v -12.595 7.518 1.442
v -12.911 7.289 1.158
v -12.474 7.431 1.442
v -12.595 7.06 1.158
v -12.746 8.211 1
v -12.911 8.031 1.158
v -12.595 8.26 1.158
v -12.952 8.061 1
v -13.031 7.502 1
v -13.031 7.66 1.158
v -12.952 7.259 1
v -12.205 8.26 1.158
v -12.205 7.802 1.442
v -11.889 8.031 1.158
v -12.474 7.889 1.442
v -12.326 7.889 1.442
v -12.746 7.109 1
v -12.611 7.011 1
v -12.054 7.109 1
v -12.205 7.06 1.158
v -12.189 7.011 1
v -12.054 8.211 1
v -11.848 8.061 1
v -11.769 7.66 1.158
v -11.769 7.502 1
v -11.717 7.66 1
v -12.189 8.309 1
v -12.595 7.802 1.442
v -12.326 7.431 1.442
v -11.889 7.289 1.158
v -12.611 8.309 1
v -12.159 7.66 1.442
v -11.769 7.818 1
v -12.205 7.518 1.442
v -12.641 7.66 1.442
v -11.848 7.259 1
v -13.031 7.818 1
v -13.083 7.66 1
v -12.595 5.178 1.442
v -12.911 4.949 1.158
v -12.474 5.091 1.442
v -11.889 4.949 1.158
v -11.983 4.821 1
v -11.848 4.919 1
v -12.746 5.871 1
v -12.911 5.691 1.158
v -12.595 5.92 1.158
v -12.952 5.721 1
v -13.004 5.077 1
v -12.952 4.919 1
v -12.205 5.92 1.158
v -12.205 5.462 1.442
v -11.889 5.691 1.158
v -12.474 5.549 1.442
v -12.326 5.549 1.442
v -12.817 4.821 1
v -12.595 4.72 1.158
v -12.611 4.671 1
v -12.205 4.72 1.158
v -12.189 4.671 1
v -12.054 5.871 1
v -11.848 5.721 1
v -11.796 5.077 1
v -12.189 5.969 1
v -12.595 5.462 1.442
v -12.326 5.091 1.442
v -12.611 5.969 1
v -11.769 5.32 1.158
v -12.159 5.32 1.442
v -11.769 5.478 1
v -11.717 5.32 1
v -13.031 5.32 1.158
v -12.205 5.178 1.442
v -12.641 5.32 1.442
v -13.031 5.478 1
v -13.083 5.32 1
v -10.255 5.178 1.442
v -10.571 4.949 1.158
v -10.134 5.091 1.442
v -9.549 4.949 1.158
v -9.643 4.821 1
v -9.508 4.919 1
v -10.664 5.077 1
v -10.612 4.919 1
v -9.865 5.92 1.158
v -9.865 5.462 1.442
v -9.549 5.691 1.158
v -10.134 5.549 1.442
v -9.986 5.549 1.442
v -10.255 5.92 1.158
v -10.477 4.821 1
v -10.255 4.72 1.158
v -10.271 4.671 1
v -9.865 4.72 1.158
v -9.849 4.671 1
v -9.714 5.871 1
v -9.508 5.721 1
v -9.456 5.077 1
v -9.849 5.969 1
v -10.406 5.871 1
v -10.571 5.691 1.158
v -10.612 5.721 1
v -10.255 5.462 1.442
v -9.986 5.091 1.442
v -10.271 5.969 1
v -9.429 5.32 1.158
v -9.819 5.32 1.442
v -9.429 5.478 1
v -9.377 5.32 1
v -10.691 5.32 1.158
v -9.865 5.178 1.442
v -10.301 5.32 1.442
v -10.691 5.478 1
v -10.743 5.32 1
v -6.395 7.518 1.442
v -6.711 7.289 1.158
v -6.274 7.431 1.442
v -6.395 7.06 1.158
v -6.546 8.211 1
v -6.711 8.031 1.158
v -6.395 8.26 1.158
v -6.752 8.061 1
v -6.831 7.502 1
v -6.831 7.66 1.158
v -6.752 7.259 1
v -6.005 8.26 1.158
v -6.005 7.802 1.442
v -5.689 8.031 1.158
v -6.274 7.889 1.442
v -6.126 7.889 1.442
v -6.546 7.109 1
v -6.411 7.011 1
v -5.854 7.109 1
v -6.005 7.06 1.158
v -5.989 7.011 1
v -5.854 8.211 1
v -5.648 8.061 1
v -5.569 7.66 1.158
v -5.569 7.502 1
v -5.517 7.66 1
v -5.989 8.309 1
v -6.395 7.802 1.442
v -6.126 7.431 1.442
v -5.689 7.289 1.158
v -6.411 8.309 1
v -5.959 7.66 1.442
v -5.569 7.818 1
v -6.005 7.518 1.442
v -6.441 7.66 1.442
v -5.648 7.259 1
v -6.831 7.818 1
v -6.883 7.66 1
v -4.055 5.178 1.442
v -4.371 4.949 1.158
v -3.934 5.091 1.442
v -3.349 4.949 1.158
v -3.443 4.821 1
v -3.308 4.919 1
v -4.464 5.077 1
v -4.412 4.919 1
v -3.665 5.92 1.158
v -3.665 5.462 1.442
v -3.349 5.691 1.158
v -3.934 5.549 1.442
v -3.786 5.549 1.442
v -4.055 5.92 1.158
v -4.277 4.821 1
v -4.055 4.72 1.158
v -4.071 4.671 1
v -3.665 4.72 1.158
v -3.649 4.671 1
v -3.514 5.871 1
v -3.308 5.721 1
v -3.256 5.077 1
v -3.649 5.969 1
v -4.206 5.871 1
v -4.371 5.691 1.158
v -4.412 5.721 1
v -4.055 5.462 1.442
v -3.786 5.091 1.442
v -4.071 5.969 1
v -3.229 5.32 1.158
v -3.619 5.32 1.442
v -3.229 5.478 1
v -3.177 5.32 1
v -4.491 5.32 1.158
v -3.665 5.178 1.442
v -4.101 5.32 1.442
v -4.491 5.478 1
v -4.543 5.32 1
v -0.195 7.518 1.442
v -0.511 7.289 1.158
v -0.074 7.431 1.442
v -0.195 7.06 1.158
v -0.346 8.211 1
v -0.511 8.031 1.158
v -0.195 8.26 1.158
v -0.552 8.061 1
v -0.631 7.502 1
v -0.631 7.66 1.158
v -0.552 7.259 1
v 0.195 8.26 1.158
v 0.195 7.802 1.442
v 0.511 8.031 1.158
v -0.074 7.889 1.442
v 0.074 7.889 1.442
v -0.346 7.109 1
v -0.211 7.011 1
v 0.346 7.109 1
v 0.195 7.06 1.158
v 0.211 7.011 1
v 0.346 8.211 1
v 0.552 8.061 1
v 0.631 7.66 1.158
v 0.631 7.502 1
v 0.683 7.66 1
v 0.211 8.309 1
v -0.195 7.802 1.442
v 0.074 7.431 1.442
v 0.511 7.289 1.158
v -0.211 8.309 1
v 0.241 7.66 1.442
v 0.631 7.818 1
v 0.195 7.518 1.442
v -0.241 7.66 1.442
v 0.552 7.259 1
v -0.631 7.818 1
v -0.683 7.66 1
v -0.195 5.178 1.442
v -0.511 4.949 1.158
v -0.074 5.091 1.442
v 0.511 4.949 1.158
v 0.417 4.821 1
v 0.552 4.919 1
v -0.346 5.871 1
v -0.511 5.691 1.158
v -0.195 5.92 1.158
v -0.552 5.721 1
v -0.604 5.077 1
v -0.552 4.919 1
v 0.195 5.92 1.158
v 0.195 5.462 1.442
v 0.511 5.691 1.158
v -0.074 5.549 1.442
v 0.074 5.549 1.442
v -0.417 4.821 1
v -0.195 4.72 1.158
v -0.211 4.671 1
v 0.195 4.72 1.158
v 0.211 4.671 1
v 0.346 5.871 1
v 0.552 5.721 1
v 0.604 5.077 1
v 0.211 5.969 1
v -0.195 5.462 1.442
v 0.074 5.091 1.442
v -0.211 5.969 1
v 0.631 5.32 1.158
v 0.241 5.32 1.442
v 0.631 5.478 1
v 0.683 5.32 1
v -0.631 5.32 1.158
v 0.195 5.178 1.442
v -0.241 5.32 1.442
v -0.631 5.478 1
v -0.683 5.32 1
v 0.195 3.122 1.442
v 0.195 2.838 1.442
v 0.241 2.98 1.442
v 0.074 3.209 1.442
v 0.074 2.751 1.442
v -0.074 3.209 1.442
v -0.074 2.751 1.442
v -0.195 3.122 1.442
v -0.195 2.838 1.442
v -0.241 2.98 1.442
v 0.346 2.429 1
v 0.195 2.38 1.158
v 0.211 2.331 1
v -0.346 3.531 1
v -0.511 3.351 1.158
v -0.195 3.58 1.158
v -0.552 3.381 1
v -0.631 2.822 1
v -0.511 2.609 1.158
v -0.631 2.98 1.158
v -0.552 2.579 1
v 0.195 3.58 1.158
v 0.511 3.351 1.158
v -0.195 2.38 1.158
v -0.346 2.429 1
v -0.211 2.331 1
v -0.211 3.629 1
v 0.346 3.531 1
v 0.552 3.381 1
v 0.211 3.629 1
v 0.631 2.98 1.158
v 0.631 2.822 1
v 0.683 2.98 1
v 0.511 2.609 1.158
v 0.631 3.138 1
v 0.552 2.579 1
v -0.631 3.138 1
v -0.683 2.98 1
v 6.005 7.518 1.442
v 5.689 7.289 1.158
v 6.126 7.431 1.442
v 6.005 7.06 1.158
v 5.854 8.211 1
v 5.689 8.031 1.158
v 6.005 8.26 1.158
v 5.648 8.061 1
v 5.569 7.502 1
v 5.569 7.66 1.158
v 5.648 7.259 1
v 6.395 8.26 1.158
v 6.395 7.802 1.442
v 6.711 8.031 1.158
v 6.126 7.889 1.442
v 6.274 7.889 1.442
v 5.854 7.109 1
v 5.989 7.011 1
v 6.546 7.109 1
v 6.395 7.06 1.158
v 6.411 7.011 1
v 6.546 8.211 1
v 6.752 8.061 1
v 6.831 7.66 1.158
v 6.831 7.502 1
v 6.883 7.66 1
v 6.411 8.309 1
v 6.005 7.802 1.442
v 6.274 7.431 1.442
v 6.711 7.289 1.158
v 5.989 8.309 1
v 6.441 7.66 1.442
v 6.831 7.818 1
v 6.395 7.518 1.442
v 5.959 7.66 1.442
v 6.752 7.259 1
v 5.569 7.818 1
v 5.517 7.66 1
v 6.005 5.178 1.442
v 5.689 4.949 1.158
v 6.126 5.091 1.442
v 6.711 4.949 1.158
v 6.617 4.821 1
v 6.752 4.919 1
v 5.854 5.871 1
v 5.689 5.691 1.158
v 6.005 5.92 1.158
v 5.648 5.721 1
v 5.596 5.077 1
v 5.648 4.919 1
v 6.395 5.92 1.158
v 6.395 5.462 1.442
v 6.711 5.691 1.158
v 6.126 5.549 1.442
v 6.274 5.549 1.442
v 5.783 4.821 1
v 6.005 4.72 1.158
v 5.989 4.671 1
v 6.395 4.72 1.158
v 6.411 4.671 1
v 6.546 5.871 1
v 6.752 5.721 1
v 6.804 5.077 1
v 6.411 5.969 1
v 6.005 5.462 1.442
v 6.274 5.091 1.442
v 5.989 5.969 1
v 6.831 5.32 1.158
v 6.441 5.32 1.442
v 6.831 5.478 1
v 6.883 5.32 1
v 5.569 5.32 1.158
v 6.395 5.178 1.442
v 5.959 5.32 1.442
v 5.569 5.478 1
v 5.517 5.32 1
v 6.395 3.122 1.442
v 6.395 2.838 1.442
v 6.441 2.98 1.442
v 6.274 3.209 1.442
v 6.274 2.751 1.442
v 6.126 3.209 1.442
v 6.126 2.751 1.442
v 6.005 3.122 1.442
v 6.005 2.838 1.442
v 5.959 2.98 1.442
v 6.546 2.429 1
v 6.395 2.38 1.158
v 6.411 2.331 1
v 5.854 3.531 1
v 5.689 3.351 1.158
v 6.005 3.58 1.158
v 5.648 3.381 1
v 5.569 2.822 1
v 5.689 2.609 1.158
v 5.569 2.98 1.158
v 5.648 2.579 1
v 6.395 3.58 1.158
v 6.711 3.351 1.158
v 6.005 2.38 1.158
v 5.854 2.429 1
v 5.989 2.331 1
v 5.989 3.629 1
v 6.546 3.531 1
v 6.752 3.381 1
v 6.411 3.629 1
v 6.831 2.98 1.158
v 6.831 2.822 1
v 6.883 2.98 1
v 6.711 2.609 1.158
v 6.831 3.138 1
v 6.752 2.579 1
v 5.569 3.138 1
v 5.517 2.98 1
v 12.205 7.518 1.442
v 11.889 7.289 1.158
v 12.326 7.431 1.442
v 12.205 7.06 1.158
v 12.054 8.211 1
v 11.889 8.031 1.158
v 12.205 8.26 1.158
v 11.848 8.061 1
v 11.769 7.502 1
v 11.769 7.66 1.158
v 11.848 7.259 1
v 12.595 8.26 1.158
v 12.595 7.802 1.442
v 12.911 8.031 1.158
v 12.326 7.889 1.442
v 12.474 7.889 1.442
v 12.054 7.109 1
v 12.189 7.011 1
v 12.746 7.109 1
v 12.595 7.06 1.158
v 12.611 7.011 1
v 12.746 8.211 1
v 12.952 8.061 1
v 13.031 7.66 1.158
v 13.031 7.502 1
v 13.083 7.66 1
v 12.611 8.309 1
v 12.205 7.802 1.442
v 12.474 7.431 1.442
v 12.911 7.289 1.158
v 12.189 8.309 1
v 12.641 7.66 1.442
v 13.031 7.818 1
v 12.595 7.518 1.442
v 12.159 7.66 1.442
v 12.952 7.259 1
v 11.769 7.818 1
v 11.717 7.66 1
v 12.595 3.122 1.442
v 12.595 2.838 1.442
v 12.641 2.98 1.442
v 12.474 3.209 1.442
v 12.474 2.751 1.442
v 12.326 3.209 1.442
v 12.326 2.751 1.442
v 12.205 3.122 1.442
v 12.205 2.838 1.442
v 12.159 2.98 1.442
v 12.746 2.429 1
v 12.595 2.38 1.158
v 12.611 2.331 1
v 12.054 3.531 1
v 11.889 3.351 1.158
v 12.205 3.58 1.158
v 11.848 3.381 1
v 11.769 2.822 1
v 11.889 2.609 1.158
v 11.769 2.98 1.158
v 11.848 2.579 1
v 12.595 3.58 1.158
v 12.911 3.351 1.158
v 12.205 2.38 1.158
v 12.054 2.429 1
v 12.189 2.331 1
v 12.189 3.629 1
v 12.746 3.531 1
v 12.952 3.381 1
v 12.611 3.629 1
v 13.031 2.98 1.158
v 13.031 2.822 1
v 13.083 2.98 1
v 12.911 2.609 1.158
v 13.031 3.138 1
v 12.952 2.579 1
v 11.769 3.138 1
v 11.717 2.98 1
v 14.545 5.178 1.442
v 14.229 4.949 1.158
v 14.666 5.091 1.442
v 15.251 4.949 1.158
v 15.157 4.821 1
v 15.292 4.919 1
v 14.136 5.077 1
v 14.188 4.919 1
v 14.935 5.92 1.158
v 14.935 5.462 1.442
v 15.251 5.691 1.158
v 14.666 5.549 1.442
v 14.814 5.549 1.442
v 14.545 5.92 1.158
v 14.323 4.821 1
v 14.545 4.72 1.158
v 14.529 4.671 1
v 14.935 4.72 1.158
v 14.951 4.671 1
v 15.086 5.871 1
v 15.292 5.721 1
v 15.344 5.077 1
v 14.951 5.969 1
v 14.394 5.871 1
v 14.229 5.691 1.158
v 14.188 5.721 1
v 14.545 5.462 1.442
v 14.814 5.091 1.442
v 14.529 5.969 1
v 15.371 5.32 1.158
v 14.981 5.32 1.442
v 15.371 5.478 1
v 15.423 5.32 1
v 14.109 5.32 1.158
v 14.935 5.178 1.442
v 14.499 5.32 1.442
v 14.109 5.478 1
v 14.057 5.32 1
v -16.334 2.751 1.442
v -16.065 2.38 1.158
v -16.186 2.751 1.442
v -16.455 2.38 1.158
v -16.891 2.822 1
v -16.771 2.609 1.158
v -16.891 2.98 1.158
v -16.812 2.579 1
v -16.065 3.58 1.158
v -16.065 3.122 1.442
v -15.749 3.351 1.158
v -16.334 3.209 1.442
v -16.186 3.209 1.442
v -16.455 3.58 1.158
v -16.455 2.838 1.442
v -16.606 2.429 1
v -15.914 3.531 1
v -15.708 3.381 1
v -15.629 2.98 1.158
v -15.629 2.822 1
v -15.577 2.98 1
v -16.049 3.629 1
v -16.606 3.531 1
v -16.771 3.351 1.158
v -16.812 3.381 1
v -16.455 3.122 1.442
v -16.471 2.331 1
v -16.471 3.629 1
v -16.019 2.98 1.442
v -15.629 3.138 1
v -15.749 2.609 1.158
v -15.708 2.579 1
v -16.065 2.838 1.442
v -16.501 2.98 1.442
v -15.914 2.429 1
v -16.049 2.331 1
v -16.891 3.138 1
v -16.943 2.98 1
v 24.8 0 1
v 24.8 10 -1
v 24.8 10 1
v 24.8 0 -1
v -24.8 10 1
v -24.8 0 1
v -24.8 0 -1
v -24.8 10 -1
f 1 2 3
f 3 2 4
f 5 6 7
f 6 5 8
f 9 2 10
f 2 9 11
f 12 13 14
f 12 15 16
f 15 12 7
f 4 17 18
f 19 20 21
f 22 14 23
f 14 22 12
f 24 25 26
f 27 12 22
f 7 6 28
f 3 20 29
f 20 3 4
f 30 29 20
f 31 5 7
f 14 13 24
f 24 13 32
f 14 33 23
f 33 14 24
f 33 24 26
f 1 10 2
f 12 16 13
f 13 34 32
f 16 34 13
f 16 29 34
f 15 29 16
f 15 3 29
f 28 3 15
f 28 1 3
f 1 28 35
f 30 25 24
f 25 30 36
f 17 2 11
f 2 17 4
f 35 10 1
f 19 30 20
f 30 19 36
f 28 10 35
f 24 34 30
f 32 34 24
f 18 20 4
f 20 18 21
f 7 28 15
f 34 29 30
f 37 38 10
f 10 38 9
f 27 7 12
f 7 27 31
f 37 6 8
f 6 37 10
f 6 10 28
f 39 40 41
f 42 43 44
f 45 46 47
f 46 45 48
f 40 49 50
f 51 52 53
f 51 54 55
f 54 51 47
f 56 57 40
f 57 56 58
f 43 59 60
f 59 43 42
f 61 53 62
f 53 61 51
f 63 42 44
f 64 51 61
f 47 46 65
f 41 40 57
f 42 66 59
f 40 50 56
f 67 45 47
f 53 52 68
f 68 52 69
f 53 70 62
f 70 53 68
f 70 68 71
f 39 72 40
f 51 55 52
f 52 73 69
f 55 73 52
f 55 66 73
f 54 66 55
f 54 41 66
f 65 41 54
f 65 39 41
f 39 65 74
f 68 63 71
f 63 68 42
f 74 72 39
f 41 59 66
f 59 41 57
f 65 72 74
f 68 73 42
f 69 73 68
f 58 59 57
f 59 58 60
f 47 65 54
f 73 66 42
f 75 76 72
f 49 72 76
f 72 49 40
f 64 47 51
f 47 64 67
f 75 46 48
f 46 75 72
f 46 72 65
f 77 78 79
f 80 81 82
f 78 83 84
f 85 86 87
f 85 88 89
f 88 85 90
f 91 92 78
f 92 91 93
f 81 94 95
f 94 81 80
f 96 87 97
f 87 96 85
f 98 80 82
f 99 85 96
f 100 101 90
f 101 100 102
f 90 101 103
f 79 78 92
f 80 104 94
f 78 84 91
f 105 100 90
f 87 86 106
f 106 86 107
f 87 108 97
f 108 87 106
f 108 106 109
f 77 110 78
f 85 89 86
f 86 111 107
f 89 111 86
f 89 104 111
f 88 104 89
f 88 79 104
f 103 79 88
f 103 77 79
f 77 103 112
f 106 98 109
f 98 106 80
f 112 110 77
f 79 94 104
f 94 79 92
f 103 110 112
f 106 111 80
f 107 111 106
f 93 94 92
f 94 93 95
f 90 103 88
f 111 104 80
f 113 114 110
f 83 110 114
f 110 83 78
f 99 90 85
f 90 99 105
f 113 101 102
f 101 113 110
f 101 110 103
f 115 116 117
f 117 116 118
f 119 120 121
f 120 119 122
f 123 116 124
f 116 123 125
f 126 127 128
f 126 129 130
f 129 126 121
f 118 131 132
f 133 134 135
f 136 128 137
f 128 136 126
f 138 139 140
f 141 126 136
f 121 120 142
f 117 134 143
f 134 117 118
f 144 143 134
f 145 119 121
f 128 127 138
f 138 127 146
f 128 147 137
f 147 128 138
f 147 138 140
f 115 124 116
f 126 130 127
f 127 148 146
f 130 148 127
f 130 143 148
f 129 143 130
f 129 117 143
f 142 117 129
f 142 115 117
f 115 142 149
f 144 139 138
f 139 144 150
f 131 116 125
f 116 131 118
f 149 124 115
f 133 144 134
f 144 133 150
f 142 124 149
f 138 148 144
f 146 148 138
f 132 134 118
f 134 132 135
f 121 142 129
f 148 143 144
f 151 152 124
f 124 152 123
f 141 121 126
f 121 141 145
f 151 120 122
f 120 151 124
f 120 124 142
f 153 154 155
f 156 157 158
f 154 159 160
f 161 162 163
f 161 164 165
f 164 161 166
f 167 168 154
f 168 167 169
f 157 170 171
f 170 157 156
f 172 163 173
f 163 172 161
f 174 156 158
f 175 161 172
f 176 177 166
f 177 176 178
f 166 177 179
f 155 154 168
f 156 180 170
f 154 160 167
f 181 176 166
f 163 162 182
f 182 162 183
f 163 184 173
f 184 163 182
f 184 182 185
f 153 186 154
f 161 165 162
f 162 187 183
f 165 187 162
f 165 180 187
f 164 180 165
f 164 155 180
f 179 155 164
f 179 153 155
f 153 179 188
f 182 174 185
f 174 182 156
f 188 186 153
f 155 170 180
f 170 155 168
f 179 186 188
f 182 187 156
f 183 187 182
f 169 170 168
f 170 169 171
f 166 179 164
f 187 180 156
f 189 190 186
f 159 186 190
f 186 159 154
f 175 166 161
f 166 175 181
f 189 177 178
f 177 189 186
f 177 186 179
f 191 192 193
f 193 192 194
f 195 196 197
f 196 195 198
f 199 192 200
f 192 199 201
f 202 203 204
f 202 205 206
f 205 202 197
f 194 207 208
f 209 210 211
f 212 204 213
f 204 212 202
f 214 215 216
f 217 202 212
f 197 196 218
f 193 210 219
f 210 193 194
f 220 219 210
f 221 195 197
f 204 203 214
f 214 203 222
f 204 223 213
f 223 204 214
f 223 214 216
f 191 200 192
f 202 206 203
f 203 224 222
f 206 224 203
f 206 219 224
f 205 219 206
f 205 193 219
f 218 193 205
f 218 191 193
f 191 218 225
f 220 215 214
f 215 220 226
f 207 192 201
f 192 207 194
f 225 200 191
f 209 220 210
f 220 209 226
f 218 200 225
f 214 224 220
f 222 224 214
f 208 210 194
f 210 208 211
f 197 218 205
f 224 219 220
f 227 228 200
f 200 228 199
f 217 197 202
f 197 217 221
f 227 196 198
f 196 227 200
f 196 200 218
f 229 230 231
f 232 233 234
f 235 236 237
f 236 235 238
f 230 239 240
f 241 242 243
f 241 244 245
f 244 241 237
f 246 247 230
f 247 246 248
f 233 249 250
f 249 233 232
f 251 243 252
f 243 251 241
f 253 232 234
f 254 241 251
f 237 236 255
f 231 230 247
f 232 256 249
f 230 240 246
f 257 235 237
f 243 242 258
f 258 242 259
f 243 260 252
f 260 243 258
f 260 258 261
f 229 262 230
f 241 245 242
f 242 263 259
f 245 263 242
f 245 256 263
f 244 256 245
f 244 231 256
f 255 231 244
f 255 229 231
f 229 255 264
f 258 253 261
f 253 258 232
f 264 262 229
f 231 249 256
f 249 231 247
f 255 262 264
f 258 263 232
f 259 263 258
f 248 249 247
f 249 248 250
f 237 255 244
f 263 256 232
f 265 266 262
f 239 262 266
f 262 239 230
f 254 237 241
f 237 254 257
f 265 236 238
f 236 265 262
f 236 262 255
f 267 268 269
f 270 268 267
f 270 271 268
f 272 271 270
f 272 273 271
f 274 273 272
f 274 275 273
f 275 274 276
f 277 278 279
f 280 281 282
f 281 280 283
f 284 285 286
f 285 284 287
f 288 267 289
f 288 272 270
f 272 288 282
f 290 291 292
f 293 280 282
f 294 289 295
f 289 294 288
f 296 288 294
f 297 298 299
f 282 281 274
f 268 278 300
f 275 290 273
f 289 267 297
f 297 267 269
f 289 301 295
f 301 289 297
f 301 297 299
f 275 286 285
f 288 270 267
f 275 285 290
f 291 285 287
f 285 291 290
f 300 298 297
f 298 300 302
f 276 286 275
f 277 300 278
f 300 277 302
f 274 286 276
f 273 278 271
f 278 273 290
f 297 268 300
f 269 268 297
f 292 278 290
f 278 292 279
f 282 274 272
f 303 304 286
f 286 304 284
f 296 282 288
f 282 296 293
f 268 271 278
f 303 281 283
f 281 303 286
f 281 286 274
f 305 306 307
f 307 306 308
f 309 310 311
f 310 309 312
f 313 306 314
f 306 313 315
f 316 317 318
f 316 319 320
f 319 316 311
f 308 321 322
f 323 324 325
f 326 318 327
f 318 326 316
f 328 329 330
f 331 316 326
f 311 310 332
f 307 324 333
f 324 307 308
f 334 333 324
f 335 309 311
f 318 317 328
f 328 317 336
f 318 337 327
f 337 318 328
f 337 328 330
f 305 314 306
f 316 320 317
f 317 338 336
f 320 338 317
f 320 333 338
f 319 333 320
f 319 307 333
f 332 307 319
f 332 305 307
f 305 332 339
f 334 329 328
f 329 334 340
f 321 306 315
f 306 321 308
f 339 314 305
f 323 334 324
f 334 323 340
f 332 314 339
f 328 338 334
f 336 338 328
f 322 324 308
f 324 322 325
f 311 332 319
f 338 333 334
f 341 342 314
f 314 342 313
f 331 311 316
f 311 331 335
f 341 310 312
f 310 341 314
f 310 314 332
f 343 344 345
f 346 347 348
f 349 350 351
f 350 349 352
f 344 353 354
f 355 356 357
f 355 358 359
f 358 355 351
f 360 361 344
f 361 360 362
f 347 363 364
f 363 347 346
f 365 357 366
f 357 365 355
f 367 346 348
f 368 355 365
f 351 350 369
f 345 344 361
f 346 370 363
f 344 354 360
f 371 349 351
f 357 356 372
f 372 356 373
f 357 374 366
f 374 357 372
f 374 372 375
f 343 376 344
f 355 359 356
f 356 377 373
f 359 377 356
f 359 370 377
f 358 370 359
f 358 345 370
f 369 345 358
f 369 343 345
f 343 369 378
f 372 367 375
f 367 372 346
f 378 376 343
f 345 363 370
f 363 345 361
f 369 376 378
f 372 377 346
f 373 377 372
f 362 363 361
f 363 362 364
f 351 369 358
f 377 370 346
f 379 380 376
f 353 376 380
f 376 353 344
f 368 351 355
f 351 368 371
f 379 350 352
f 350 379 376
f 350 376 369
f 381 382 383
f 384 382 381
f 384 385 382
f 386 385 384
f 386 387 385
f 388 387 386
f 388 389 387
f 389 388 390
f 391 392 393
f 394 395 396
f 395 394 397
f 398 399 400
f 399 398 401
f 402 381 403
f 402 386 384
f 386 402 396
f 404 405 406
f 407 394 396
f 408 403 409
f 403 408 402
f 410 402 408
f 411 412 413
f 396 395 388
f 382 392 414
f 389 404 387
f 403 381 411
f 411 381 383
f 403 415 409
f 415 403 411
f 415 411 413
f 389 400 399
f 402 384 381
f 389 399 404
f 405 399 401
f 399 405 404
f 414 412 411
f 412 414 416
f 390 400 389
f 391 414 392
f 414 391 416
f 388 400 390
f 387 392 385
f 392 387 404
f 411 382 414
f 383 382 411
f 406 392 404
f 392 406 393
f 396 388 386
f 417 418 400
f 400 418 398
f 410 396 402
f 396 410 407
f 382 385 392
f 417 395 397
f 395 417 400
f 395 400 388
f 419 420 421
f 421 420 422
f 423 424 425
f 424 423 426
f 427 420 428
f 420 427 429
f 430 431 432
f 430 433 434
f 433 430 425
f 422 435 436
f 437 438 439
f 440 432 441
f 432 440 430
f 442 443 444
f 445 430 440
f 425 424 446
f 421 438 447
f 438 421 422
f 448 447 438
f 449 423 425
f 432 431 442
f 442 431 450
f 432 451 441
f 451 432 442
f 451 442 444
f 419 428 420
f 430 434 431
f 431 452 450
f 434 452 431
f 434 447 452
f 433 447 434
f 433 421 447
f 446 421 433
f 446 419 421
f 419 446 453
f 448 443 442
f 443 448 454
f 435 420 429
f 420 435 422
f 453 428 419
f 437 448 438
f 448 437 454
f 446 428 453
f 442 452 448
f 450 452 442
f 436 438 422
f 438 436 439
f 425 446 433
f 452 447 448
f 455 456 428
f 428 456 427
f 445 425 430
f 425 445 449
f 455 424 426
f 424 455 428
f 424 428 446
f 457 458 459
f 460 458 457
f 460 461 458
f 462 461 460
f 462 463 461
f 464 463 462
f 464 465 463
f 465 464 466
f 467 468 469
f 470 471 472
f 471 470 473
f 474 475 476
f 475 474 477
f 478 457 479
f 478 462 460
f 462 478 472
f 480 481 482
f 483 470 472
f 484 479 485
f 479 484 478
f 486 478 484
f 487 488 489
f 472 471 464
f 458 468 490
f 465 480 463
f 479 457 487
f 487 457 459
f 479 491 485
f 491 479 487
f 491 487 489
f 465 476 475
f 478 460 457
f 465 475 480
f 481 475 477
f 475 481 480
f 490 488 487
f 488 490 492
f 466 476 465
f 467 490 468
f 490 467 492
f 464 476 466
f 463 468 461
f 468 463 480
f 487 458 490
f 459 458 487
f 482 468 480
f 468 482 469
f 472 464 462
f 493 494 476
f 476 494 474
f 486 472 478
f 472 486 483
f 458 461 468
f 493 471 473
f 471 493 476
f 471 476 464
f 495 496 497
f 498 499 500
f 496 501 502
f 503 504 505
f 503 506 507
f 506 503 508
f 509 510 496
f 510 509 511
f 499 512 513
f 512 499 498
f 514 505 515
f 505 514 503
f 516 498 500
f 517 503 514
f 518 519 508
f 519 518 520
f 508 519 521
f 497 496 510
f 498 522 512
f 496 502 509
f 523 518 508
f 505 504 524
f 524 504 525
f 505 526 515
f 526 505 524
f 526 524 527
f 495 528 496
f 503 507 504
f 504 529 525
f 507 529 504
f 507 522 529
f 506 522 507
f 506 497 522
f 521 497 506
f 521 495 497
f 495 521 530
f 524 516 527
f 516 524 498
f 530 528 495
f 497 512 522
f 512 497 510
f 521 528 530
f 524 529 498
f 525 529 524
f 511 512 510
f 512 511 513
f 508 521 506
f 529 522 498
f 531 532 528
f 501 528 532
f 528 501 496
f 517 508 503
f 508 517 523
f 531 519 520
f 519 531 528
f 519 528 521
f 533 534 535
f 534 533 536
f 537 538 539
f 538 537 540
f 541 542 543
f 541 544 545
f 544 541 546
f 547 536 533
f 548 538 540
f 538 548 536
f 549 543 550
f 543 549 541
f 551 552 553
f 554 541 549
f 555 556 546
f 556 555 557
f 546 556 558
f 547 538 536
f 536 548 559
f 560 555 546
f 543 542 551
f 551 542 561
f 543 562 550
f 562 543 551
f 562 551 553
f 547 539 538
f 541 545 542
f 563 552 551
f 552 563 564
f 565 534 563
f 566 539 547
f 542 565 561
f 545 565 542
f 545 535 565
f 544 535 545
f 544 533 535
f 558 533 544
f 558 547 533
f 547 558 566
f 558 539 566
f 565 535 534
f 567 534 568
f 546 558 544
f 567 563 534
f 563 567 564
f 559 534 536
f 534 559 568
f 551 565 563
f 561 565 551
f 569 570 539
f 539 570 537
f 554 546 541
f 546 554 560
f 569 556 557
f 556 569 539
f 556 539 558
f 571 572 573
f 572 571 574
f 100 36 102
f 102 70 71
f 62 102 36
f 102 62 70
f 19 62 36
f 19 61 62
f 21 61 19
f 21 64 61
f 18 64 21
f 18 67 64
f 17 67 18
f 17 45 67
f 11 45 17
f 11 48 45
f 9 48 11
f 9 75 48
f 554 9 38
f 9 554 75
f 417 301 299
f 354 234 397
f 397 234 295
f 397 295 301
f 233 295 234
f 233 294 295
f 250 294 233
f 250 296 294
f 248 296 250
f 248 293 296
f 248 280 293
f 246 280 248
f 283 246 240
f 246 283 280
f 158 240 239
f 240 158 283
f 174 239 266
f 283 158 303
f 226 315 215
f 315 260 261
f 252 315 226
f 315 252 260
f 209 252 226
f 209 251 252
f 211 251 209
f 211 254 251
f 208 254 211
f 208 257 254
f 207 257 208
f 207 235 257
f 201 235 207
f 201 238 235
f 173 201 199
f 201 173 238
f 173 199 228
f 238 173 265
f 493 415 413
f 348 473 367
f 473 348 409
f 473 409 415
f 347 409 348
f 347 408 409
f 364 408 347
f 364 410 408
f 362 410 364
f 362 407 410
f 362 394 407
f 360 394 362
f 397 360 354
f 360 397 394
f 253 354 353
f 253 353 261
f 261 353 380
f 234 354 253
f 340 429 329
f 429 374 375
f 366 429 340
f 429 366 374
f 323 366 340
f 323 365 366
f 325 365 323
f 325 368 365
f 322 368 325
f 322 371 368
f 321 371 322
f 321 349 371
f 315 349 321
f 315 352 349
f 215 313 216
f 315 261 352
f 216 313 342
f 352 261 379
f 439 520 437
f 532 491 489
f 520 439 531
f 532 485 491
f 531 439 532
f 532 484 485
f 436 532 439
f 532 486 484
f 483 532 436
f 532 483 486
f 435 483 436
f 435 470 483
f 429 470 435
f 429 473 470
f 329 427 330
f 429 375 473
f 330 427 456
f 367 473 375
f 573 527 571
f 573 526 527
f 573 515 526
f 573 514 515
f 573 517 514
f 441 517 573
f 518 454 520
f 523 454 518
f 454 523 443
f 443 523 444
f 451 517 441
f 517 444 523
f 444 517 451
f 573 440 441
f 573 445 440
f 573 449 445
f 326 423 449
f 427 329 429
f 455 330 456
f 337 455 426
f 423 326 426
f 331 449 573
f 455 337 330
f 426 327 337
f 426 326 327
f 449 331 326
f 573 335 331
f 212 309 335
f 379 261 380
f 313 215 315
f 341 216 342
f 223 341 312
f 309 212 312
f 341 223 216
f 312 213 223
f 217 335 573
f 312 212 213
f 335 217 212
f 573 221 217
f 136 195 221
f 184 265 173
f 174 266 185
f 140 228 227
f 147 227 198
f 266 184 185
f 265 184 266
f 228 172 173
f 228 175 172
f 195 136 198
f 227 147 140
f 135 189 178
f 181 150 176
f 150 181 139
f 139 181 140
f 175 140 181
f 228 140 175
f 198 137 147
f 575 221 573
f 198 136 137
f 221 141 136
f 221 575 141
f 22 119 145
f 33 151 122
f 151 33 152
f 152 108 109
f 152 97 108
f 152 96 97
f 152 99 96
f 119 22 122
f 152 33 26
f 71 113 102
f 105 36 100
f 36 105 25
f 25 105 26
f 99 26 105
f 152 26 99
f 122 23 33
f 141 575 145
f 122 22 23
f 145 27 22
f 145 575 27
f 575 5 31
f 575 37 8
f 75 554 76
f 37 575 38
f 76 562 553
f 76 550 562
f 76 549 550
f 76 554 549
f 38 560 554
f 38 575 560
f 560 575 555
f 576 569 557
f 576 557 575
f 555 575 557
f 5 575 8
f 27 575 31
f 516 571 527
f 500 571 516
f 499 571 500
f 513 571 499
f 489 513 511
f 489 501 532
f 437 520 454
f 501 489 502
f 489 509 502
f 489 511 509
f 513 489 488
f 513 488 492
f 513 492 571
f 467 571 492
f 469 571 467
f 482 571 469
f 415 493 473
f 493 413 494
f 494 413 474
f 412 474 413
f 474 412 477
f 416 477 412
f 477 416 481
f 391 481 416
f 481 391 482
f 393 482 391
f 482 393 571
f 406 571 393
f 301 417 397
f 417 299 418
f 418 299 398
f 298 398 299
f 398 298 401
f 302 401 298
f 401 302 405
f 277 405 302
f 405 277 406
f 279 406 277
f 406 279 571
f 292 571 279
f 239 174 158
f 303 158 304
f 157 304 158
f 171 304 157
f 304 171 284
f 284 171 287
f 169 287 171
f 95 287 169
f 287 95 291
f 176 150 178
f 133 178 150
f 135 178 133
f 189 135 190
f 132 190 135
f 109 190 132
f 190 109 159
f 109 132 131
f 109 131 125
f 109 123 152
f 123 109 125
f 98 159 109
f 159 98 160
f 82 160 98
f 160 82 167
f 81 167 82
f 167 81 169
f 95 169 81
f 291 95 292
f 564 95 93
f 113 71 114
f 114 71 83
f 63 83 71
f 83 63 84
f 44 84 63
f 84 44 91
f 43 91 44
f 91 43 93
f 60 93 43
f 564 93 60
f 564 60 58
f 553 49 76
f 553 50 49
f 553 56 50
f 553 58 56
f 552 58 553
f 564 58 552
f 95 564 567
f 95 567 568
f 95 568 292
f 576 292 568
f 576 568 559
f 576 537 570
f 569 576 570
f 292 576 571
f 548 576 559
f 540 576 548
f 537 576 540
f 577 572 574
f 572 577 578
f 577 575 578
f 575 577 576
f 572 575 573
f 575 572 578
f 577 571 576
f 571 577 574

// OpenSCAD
/*
  based on http://www.thingiverse.com/thing:8000
  mods : 
              braille font parameters set as global variables (prefixed $) for clarity
              resolution set globally
              module for printing the label, multiple lines -drawText() - as well as a line - drawLine() 
              dropped the difference operation when drawing dots since embedded in slab anyway
              dot sphere offset because spec requires base which is longer than 2 times the height 
              functions added to compute the radius from a chord length and height
              length() > len()
              max line length calculated with recursive function so width of slab 
                     can be calculated
  todo       mark so the fitter  knows which way up it goes - chamfer top edge?
             allow capitials -openSCAD lacks a function to change the case of a letter, 
                    hence the duplicate entries for both forms of the letter
                    adding the shift character for an uppercase letter is tricky since cannot simply 
                    accumulate the length printed  
             use search instead of looping throught the parallel array for easier maintenance 
*/

/* Joe Fields - Feb. 2020
   Fixed some warnings and deprecations.
   Added support for numbers (added the octothorpe (#) for the Braille number sign, underscore (_) for the decimal point 
    and also the digits which are just repeats of a--j.
   Added a caret "^" for the Braille capitalization symbol.
   Added a flag to allow for left-justified text as well as centered (the default).
*/

$fa = 0.01; $fs = 0.5; 

// global dimensions from http://www.brailleauthority.org/sizespacingofbraille/sizespacingofbraille.pdf

$dotHeight = 0.48;
$dotBase = 1.44;
$dotRadius = $dotBase /2;
$dotWidth= 2.34;
$charWidth = 6.2;
$lineHeight = 10; 

// compute the sphere to make the raised dot
$dotSphereRadius  =  chord_radius($dotBase,$dotHeight);
$dotSphereOffset = $dotSphereRadius - $dotHeight;

function max_length_r(v, i, max) =
     i == len(v) ? max : max_length_r(v, i+1, len(v[i]) > max ? len(v[i]) : max);

function max_length(v) = max_length_r(v,0,0);

// dot is not a hemisphere 

function chord_radius(length,height) = ( length * length /(4 * height) + height)/2;

$charKeys = ["a", "A", "b", "B", "c", "C", "d", "D", "e", "E", "f", "F", "g", "G", "h", "H", "i", "I", "j", "J", "k", "K", "l", "L", "m", "M", "n", "N", "o", "O", "p", "P", "q", "Q", "r", "R", "s", "S", "t", "T", "u", "U", "v", "V", "w", "W", "x", "X", "y", "Y", "z", "Z", ",", ";", ":", ".", "!", "(", ")", "?", "\"", "*", "'", "-", "#", "1", "2","3","4","5","6","7","8","9","0","_", "^"];

/*Note the Braille dots in the 3 by 2 grid are numbered thusly:

    1  4
    2  5
    3  6
*/

$charValues = [[1], [1], [1, 2], [1, 2], [1, 4], [1, 4], [1, 4, 5], [1, 4, 5], [1, 5], [1, 5], [1, 2, 4], [1, 2, 4], [1, 2, 4, 5], [1, 2, 4, 5], [1, 2, 5], [1, 2, 5], [2, 4], [2, 4], [2, 4, 5], [2, 4, 5], [1, 3], [1, 3], [1, 2, 3], [1, 2, 3], [1, 3, 4], [1, 3, 4], [1, 3, 4, 5], [1, 3, 4, 5], [1, 3, 5], [1, 3, 5], [1, 2, 3, 4], [1, 2, 3, 4], [1, 2, 3, 4, 5], [1, 2, 3, 4, 5], [1, 2, 3, 5], [1, 2, 3, 5], [2, 3, 4], [2, 3, 4], [2, 3, 4, 5], [2, 3, 4, 5], [1, 3, 6], [1, 3, 6], [1, 2, 3, 6], [1, 2, 3, 6], [2, 4, 5, 6], [2, 4, 5, 6], [1, 3, 4, 6], [1, 3, 4, 6], [1, 3, 4, 5, 6], [1, 3, 4, 5, 6], [1, 3, 5, 6], [1, 3, 5, 6], [2], [2, 3], [2, 5], [2, 5, 6], [2, 3, 5], [2, 3, 5, 6], [2, 3, 5, 6], [2, 3, 6], [2, 3, 6], [3, 5], [3], [3, 6], [3,4,5,6], [1], [1, 2], [1, 4], [1, 4, 5], [1, 5], [1, 2, 4], [1, 2, 4, 5], [1, 2, 5], [2, 4], [2, 4, 5], [4,6], [6]
];


module drawDot(location) {
    translate(location) translate ([0,0, -$dotSphereOffset ]) sphere($dotSphereRadius);
}

module drawCharacter(charMap) {
     for(i = [0: len(charMap)-1]) {
         dot = charMap[i] - 1;
         drawDot(   [floor(dot / 3) * $dotWidth,  -((1+(dot % 3)) * $dotWidth),   0] );
     }
}


module drawLine(line) {
    for(i = [0: len(line)-1]) { 
        translate([$charWidth*i, 0, 0]) {
            for(j = [0:len($charKeys)]) {
                if($charKeys[j] == line[i]) {
                    drawCharacter($charValues[j]);
                }
            }
        }
    }      
}

module drawText(text, just=1) {
    totalHeight = len(text) * $lineHeight;
    mx = max_length(text);
    //echo(mx, $charWidth);
    
    hz = -1 * mx * $charWidth / 2;
    
    translate([0, 0, 1]) {
        for(i = [0: len(text)-1]) {
            vrt = totalHeight-$lineHeight*(i);
            if (just==1) {
                hz = -len(text[i])*$charWidth/2;
                translate([hz, vrt, 0]) {
                    drawLine(text[i]);
                }
            } else {
                hz = -1 * mx * $charWidth / 2;
                translate([hz, vrt, 0]) {
                    drawLine(text[i]);
                }
            }
        }
    }
}

module label(text, depth=2, just=1) {
     width = (max_length(text) + 2)  * $charWidth;
     height = len(text) * $lineHeight;
        union() {
            translate([0, height/2, 0]) {
                cube([width, height, depth], true);
            }
            drawText(text, just);
       }
}


text = ["^Hello"]; 

//text = ["^All human beings are born", "free and equal in dignity and", "rights. ^They are endowed with", "reason and conscience and", "should act towards one another", "in a spirit of brotherhood."]; 

//Test case for numbers:
//text = ["^The first #10 digits of pi", "are #3_141592654"];

label(text);

//translate([0,80,0]) label(text, just=0); //Test case for left-alignment
